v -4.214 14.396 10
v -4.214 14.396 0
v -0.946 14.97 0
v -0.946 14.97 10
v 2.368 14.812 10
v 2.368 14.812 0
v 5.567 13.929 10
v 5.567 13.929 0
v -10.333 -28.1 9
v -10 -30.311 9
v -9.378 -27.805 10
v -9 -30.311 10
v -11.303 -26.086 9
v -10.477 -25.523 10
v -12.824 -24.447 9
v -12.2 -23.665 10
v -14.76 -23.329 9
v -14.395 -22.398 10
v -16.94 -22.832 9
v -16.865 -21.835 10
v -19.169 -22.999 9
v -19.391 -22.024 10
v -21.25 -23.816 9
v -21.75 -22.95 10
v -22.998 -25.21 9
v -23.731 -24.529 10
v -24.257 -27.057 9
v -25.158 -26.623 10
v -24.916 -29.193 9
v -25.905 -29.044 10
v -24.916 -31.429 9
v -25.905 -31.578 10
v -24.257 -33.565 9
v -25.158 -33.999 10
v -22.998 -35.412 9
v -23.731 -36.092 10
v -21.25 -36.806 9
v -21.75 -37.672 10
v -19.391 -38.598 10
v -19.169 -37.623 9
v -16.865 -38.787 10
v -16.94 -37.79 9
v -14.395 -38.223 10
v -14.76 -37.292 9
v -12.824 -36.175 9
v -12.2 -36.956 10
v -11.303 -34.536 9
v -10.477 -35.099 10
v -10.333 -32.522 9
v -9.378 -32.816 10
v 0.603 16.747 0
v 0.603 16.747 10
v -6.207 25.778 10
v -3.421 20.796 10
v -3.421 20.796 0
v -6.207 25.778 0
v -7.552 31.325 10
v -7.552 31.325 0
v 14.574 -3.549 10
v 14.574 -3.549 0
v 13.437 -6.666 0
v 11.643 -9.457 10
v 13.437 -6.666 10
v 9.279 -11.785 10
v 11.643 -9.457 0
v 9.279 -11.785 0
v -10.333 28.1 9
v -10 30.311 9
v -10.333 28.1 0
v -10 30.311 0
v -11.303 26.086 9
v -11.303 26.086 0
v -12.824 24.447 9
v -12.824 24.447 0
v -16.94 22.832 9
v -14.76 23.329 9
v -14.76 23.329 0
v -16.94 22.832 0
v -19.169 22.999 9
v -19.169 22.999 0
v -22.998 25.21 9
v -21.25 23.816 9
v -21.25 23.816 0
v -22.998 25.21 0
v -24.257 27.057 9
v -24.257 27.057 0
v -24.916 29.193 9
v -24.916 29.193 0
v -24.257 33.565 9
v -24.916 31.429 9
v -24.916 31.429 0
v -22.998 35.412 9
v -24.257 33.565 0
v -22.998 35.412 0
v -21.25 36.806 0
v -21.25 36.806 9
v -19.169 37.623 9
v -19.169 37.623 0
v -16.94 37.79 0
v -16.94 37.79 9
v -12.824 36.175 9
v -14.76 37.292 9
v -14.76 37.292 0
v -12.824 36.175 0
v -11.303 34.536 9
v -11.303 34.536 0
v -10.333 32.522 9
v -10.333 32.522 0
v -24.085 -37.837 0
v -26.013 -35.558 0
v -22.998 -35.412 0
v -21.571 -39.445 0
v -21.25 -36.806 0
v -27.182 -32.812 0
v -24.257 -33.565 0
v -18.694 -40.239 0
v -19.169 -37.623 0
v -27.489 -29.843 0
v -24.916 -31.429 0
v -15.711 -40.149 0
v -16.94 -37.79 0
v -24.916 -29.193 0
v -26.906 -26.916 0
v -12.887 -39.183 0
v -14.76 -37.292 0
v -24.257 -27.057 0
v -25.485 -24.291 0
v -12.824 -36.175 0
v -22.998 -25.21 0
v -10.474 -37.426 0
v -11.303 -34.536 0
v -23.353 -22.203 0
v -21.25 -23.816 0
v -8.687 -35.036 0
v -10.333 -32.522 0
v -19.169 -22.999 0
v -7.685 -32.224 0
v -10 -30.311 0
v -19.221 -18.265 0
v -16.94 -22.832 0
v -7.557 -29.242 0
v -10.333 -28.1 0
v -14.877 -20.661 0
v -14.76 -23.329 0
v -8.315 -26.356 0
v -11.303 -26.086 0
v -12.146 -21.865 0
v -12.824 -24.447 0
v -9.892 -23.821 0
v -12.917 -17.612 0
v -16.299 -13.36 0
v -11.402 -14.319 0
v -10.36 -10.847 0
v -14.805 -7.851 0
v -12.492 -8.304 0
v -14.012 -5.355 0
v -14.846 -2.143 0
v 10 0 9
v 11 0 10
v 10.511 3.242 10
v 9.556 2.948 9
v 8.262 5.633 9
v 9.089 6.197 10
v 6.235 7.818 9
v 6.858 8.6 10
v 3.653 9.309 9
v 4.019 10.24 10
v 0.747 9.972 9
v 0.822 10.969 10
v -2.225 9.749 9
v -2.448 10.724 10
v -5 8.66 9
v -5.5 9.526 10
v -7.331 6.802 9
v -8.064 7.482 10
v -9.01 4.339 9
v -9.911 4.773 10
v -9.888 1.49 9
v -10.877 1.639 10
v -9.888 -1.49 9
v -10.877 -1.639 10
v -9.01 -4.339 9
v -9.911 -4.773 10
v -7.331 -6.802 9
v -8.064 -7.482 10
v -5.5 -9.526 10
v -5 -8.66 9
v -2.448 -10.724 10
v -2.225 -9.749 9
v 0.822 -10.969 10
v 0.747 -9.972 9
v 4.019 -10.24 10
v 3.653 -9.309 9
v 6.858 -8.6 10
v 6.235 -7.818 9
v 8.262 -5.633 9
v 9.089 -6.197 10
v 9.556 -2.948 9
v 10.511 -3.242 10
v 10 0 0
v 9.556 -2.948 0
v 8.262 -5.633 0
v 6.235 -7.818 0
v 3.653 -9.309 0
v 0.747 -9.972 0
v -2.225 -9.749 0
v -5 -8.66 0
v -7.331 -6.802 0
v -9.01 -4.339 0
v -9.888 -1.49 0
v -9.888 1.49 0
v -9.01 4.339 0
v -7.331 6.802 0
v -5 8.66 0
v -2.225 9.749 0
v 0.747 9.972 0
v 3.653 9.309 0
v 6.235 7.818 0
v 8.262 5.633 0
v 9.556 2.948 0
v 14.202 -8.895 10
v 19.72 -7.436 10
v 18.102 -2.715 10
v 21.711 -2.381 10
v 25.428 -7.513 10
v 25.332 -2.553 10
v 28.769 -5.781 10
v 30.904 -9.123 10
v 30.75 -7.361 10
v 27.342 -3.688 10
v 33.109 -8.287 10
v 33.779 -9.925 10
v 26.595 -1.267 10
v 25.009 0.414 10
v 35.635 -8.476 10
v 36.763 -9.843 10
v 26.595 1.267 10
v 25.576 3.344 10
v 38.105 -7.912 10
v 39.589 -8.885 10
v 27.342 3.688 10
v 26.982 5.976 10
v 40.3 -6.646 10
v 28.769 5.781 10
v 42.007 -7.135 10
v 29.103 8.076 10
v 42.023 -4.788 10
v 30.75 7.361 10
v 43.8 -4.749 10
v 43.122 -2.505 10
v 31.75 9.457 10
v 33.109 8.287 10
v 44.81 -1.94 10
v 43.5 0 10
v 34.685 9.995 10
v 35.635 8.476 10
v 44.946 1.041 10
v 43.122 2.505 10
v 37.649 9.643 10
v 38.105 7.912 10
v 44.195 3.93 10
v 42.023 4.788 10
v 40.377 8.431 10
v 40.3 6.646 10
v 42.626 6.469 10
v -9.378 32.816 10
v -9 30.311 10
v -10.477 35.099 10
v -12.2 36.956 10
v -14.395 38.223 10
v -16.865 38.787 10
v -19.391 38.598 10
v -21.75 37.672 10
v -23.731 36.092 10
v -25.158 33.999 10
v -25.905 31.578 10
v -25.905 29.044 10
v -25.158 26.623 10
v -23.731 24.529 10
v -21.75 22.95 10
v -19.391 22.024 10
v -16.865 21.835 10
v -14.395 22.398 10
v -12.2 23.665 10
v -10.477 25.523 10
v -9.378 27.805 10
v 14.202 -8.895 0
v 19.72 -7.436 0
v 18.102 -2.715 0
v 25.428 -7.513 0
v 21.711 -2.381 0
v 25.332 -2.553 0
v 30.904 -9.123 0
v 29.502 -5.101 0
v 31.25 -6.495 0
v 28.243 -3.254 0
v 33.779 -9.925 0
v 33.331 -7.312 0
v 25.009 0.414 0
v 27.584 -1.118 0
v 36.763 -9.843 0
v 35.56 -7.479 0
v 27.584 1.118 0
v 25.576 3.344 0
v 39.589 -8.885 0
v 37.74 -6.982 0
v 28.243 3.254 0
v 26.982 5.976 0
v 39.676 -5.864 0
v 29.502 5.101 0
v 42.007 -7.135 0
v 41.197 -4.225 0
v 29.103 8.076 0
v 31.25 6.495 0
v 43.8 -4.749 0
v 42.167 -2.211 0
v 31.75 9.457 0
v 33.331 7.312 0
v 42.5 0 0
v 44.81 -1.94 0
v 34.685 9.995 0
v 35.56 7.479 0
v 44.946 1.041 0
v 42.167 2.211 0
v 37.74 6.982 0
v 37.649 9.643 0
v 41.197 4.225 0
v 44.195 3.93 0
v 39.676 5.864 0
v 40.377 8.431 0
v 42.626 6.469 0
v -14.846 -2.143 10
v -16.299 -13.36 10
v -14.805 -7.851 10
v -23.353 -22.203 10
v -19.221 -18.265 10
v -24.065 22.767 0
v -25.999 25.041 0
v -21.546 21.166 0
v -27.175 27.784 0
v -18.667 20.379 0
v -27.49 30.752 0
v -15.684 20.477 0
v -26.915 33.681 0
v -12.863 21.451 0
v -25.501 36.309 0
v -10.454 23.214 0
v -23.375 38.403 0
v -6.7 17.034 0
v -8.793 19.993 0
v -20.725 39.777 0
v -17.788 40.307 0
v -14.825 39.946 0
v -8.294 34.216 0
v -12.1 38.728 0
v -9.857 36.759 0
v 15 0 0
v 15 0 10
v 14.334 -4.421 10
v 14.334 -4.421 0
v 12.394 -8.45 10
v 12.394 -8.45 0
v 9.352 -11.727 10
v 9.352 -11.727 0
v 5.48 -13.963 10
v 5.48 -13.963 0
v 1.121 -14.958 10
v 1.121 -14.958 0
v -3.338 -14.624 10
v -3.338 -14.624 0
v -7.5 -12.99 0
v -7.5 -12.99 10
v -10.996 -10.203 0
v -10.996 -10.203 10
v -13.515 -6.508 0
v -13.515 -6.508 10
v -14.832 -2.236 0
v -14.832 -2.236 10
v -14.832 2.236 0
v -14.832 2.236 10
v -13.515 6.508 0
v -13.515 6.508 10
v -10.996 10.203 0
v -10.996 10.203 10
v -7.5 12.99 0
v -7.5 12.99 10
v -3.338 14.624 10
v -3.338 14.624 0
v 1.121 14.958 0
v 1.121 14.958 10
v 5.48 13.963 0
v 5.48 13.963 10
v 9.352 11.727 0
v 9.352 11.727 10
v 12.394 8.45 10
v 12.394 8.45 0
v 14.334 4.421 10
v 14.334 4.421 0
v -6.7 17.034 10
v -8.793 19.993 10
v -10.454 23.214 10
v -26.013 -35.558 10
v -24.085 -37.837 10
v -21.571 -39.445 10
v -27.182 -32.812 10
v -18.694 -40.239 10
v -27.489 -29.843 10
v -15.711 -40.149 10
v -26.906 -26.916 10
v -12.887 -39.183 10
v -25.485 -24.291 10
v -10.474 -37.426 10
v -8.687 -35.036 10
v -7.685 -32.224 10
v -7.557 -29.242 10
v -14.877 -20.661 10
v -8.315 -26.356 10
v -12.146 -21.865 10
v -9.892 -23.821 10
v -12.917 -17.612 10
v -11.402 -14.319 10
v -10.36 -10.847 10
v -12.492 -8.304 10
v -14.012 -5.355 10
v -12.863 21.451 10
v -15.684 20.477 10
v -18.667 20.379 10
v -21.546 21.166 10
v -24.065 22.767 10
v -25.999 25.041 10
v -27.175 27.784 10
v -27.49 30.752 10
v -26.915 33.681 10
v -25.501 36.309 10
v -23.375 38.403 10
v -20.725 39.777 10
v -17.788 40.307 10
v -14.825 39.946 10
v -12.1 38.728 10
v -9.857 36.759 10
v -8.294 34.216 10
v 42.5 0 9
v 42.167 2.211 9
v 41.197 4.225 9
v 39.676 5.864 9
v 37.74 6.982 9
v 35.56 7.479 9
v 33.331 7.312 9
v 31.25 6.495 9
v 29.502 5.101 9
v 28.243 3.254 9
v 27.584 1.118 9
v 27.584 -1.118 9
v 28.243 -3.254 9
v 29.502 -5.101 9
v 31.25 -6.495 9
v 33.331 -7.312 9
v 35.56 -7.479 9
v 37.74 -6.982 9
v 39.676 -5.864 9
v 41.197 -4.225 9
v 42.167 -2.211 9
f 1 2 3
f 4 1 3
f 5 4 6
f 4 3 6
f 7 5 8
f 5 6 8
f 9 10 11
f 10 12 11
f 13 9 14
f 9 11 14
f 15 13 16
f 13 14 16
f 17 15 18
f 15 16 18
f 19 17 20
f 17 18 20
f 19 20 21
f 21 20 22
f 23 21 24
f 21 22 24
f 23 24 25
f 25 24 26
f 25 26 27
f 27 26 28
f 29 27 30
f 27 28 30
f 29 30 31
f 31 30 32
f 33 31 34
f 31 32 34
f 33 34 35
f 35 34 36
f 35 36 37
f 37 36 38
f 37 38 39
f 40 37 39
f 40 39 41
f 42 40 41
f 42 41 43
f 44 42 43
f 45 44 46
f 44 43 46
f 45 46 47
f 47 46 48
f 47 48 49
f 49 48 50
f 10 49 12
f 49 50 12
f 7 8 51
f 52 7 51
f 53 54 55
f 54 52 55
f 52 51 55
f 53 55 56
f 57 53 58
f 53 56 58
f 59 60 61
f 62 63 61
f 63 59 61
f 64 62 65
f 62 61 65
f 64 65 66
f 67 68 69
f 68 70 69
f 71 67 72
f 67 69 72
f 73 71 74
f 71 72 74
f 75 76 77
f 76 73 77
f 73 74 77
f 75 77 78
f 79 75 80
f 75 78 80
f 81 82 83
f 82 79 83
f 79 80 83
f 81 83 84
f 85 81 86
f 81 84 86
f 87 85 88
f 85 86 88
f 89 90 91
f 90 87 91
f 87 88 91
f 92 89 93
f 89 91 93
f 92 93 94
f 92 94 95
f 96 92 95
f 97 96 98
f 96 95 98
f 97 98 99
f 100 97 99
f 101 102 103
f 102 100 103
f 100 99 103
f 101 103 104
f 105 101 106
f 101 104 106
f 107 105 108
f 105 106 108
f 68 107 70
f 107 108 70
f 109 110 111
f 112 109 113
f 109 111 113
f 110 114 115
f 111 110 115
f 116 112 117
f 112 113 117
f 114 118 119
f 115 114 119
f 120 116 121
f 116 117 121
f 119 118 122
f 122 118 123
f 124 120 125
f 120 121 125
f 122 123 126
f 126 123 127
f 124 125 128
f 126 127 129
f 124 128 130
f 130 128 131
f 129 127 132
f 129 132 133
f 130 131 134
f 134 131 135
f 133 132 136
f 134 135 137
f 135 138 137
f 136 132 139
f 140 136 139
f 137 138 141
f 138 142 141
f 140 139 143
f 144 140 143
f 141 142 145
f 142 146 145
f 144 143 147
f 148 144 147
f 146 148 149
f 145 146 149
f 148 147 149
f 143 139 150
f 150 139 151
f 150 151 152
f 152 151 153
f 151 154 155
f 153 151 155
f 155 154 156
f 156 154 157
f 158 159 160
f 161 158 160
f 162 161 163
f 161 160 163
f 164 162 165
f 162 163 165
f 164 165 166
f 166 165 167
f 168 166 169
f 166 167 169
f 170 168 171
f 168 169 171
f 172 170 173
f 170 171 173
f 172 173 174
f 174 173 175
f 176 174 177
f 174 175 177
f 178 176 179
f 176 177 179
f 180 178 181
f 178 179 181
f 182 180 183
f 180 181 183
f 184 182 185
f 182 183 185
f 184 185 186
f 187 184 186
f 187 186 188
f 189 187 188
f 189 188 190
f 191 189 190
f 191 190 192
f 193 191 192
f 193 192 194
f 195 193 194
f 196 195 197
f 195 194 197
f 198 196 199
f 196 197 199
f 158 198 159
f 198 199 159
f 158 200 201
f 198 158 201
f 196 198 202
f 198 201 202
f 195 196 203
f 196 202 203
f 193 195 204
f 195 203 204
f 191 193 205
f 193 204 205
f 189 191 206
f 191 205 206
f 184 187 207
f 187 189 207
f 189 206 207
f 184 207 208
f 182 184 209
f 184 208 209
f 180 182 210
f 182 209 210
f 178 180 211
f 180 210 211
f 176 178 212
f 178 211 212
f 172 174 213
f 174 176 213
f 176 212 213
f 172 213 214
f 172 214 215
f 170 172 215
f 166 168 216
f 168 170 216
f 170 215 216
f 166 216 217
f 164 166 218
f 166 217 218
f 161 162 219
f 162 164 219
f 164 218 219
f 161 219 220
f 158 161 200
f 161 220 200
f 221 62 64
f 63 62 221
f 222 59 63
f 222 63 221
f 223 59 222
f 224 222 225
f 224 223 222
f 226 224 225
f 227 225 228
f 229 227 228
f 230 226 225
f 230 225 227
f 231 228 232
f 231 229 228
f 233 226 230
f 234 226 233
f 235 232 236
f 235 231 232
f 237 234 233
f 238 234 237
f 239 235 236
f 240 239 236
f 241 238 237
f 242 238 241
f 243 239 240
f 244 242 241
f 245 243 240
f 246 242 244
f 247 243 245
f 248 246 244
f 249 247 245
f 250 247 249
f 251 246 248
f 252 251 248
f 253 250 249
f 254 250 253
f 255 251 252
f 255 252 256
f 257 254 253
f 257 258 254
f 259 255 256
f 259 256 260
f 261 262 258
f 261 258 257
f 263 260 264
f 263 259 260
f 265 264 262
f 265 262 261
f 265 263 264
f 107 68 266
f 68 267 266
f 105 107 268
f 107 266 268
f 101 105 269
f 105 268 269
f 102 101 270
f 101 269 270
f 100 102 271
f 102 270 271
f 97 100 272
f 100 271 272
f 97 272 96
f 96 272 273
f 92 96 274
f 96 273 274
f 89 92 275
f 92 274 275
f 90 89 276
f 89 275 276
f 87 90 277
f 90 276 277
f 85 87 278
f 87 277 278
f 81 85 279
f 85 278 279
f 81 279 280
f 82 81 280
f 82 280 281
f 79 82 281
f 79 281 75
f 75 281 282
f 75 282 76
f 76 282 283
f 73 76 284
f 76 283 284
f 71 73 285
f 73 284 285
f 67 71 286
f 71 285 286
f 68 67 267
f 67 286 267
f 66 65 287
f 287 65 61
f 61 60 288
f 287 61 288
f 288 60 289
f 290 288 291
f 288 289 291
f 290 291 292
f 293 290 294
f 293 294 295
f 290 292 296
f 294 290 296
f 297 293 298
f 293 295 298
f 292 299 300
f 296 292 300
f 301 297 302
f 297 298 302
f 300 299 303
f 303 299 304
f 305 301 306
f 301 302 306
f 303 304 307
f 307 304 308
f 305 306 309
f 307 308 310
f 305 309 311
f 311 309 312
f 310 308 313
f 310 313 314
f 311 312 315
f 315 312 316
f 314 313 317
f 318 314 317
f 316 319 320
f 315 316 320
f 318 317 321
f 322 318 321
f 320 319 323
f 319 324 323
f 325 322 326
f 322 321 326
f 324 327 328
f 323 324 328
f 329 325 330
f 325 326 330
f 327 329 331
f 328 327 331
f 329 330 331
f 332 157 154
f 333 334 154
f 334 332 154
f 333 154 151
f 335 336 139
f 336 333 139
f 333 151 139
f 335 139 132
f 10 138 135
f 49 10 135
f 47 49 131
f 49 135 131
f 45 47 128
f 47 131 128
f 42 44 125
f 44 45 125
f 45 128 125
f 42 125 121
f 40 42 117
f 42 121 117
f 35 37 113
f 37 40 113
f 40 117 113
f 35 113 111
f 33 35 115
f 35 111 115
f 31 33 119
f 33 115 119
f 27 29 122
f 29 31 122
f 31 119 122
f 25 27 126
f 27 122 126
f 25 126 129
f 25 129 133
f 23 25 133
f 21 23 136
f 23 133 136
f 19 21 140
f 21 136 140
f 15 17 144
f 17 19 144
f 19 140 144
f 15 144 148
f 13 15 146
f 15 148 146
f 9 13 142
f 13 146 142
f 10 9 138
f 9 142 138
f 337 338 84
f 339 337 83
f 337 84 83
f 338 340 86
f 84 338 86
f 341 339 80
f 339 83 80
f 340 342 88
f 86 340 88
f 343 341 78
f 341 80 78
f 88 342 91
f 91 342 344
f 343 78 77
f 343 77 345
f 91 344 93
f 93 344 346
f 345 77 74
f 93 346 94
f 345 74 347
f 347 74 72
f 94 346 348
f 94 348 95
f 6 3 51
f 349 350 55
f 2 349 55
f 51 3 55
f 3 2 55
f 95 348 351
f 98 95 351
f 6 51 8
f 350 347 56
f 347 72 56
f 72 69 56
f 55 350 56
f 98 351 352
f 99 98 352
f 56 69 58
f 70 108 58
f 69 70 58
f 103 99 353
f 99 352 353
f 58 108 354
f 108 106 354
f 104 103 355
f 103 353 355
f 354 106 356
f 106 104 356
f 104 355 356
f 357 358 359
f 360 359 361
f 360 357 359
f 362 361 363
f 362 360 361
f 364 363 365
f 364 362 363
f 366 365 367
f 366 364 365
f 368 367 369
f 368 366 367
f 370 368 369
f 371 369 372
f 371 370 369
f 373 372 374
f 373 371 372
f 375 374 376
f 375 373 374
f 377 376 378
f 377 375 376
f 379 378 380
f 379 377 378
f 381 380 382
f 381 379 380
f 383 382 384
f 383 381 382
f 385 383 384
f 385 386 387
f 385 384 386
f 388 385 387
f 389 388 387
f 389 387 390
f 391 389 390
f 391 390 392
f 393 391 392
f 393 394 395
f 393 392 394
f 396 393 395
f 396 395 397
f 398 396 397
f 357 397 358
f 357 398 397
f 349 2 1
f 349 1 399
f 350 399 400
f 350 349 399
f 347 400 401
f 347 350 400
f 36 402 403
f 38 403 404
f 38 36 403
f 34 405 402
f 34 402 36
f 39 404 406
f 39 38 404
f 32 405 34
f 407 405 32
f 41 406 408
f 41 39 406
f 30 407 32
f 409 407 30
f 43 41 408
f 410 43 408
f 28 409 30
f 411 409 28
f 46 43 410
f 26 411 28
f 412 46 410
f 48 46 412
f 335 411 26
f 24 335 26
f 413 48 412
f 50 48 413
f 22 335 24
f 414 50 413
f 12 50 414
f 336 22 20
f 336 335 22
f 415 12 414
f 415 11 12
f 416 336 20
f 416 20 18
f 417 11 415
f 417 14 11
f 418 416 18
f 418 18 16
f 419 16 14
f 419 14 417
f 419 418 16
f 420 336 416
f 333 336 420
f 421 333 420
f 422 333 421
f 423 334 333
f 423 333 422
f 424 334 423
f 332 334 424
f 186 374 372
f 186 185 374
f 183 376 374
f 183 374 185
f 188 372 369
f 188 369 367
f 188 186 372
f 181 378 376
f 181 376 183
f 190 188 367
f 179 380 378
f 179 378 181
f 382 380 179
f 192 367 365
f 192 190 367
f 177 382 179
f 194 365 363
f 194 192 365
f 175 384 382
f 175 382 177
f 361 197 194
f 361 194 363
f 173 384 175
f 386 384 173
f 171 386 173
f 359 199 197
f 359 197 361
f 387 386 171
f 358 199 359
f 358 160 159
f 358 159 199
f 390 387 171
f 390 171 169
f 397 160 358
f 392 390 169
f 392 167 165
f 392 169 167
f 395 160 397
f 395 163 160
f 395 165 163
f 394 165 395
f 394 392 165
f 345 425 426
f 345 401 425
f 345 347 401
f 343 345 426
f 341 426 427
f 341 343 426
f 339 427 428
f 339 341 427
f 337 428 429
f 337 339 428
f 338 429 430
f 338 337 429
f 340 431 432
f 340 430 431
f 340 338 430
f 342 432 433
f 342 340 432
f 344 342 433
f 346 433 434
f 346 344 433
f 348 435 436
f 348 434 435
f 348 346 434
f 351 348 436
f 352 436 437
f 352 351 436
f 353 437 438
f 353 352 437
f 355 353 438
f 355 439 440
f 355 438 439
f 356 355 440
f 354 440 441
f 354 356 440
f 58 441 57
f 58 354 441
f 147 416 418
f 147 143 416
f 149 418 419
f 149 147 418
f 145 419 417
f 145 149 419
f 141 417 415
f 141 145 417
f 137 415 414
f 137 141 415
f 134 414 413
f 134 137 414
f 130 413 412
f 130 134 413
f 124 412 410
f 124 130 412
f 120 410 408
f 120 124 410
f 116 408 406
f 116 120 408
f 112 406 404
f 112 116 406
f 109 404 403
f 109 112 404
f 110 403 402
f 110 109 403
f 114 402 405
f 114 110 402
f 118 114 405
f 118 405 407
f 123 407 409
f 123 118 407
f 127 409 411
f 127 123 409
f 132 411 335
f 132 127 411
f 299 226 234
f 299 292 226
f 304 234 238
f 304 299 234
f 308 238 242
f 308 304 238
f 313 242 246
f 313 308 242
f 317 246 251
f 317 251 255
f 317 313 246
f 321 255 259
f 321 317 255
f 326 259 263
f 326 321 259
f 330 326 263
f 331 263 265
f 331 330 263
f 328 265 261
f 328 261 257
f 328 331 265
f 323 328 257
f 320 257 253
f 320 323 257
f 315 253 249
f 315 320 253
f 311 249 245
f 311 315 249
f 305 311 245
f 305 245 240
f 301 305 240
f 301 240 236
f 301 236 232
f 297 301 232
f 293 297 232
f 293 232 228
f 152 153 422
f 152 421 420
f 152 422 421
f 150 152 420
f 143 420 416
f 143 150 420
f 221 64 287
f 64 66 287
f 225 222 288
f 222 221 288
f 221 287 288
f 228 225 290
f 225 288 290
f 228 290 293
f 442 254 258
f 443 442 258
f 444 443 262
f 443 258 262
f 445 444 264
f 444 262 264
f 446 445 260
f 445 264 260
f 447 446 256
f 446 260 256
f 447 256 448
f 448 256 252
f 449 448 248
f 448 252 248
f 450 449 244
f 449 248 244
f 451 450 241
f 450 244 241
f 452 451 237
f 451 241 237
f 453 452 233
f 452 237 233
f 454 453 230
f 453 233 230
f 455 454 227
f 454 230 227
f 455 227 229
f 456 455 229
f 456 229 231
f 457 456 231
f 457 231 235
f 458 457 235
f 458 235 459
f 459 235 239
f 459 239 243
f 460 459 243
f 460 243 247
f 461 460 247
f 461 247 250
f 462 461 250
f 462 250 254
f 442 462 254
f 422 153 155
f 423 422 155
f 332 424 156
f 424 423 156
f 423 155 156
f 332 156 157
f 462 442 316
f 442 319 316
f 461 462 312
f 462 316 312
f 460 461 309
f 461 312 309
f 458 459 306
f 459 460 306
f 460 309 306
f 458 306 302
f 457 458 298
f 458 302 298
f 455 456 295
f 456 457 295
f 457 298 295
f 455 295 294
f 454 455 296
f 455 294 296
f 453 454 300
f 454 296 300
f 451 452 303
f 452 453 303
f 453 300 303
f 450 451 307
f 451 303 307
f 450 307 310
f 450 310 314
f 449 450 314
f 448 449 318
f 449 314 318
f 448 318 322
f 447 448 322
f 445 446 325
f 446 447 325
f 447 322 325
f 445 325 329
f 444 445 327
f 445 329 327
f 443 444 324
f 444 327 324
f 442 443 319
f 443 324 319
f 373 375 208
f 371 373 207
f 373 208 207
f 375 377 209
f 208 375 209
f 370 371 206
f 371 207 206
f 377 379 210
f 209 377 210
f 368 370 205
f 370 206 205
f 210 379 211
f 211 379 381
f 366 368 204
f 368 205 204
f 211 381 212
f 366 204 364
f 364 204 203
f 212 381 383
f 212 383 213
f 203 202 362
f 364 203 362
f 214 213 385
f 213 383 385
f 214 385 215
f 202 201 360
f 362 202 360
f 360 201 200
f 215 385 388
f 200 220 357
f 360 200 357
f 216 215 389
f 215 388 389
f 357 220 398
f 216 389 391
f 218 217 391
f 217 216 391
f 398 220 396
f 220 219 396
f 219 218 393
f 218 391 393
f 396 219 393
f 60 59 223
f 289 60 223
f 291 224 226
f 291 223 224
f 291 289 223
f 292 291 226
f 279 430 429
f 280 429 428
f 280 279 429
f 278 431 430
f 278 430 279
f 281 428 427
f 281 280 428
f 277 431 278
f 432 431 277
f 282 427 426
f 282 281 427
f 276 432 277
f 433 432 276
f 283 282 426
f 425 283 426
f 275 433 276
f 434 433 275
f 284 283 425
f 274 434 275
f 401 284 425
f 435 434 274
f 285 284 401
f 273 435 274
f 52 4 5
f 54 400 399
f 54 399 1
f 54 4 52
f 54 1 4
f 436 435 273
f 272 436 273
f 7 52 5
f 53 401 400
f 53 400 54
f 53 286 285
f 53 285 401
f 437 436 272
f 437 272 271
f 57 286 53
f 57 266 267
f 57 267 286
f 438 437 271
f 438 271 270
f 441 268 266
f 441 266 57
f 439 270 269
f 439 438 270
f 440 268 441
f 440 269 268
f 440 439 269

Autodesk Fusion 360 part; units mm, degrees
sketch "Sketch3" plane through (0, 0, 0) normal (0, 0, 1) x (1, 0, 0)
  circle A0 centre (0, 0) radius 15
  circle A1 centre (35, 0) radius 10
  arc A2 (30.9044, -9.1228) -> (9.2793, -11.7854) centre (22.2903, -28.3102) ccw
  circle A3 centre (0, 0) radius 10
  line L0 (1.75, 0) -> (22.5, 0) construction
  circle A4 centre (35, 0) radius 7.5
  arc A5 (25.3315, -2.5534) -> (14.5741, -3.549) centre (22.2903, -28.3102) ccw
  arc A6 (-10.4544, 23.2144) -> (-4.2136, 14.396) centre (13.3722, 33.4591) ccw
  arc A7 (-7.5516, 31.3254) -> (5.5668, 13.9288) centre (13.3722, 33.4591) ccw
  circle A8 centre (-17.5, 30.3109) radius 10
  circle A9 centre (-17.5, 30.3109) radius 7.5
  arc A10 (-14.8771, -20.661) -> (-10.3605, -10.8471) centre (-35.6626, -5.1489) ccw
  arc A11 (-23.3528, -22.2026) -> (-14.8461, -2.1434) centre (-35.6626, -5.1489) ccw
  circle A12 centre (-17.5, -30.3109) radius 10
  circle A13 centre (-17.5, -30.3109) radius 7.5
  dimension "d22" = 30
  dimension "d25" = 20
  dimension "d34" = 20
  dimension "d36" = 15
  dimension "d40" = 360
  dimension "d49" = 35
extrude "Extrude5" add sketch "Sketch3" along normal blind 10 contours A0 makes body 1
extrude "Extrude6" add sketch "Sketch3" along normal blind 10 separate body contours A0 A6 A7 A8 | A0 A1 A2 A5 | A8 | A1 | A0 A10 A11 A12 | A12 makes body 2 at (25.1251, -1.5768, 3.3333) makes body 3 at (-23.68, 22.4491, 6.6667) makes body 4 at (-24.132, -22.8265, 3.3333)
chamfer "Chamfer1" distance 1 angle 45 4 edges at (28.0075, 2.7121, 10) (-9.3233, 3.6162, 10) (-24.4925, 33.023, 10) (-24.4925, -27.5988, 10) on bodies 1 2 3 4
